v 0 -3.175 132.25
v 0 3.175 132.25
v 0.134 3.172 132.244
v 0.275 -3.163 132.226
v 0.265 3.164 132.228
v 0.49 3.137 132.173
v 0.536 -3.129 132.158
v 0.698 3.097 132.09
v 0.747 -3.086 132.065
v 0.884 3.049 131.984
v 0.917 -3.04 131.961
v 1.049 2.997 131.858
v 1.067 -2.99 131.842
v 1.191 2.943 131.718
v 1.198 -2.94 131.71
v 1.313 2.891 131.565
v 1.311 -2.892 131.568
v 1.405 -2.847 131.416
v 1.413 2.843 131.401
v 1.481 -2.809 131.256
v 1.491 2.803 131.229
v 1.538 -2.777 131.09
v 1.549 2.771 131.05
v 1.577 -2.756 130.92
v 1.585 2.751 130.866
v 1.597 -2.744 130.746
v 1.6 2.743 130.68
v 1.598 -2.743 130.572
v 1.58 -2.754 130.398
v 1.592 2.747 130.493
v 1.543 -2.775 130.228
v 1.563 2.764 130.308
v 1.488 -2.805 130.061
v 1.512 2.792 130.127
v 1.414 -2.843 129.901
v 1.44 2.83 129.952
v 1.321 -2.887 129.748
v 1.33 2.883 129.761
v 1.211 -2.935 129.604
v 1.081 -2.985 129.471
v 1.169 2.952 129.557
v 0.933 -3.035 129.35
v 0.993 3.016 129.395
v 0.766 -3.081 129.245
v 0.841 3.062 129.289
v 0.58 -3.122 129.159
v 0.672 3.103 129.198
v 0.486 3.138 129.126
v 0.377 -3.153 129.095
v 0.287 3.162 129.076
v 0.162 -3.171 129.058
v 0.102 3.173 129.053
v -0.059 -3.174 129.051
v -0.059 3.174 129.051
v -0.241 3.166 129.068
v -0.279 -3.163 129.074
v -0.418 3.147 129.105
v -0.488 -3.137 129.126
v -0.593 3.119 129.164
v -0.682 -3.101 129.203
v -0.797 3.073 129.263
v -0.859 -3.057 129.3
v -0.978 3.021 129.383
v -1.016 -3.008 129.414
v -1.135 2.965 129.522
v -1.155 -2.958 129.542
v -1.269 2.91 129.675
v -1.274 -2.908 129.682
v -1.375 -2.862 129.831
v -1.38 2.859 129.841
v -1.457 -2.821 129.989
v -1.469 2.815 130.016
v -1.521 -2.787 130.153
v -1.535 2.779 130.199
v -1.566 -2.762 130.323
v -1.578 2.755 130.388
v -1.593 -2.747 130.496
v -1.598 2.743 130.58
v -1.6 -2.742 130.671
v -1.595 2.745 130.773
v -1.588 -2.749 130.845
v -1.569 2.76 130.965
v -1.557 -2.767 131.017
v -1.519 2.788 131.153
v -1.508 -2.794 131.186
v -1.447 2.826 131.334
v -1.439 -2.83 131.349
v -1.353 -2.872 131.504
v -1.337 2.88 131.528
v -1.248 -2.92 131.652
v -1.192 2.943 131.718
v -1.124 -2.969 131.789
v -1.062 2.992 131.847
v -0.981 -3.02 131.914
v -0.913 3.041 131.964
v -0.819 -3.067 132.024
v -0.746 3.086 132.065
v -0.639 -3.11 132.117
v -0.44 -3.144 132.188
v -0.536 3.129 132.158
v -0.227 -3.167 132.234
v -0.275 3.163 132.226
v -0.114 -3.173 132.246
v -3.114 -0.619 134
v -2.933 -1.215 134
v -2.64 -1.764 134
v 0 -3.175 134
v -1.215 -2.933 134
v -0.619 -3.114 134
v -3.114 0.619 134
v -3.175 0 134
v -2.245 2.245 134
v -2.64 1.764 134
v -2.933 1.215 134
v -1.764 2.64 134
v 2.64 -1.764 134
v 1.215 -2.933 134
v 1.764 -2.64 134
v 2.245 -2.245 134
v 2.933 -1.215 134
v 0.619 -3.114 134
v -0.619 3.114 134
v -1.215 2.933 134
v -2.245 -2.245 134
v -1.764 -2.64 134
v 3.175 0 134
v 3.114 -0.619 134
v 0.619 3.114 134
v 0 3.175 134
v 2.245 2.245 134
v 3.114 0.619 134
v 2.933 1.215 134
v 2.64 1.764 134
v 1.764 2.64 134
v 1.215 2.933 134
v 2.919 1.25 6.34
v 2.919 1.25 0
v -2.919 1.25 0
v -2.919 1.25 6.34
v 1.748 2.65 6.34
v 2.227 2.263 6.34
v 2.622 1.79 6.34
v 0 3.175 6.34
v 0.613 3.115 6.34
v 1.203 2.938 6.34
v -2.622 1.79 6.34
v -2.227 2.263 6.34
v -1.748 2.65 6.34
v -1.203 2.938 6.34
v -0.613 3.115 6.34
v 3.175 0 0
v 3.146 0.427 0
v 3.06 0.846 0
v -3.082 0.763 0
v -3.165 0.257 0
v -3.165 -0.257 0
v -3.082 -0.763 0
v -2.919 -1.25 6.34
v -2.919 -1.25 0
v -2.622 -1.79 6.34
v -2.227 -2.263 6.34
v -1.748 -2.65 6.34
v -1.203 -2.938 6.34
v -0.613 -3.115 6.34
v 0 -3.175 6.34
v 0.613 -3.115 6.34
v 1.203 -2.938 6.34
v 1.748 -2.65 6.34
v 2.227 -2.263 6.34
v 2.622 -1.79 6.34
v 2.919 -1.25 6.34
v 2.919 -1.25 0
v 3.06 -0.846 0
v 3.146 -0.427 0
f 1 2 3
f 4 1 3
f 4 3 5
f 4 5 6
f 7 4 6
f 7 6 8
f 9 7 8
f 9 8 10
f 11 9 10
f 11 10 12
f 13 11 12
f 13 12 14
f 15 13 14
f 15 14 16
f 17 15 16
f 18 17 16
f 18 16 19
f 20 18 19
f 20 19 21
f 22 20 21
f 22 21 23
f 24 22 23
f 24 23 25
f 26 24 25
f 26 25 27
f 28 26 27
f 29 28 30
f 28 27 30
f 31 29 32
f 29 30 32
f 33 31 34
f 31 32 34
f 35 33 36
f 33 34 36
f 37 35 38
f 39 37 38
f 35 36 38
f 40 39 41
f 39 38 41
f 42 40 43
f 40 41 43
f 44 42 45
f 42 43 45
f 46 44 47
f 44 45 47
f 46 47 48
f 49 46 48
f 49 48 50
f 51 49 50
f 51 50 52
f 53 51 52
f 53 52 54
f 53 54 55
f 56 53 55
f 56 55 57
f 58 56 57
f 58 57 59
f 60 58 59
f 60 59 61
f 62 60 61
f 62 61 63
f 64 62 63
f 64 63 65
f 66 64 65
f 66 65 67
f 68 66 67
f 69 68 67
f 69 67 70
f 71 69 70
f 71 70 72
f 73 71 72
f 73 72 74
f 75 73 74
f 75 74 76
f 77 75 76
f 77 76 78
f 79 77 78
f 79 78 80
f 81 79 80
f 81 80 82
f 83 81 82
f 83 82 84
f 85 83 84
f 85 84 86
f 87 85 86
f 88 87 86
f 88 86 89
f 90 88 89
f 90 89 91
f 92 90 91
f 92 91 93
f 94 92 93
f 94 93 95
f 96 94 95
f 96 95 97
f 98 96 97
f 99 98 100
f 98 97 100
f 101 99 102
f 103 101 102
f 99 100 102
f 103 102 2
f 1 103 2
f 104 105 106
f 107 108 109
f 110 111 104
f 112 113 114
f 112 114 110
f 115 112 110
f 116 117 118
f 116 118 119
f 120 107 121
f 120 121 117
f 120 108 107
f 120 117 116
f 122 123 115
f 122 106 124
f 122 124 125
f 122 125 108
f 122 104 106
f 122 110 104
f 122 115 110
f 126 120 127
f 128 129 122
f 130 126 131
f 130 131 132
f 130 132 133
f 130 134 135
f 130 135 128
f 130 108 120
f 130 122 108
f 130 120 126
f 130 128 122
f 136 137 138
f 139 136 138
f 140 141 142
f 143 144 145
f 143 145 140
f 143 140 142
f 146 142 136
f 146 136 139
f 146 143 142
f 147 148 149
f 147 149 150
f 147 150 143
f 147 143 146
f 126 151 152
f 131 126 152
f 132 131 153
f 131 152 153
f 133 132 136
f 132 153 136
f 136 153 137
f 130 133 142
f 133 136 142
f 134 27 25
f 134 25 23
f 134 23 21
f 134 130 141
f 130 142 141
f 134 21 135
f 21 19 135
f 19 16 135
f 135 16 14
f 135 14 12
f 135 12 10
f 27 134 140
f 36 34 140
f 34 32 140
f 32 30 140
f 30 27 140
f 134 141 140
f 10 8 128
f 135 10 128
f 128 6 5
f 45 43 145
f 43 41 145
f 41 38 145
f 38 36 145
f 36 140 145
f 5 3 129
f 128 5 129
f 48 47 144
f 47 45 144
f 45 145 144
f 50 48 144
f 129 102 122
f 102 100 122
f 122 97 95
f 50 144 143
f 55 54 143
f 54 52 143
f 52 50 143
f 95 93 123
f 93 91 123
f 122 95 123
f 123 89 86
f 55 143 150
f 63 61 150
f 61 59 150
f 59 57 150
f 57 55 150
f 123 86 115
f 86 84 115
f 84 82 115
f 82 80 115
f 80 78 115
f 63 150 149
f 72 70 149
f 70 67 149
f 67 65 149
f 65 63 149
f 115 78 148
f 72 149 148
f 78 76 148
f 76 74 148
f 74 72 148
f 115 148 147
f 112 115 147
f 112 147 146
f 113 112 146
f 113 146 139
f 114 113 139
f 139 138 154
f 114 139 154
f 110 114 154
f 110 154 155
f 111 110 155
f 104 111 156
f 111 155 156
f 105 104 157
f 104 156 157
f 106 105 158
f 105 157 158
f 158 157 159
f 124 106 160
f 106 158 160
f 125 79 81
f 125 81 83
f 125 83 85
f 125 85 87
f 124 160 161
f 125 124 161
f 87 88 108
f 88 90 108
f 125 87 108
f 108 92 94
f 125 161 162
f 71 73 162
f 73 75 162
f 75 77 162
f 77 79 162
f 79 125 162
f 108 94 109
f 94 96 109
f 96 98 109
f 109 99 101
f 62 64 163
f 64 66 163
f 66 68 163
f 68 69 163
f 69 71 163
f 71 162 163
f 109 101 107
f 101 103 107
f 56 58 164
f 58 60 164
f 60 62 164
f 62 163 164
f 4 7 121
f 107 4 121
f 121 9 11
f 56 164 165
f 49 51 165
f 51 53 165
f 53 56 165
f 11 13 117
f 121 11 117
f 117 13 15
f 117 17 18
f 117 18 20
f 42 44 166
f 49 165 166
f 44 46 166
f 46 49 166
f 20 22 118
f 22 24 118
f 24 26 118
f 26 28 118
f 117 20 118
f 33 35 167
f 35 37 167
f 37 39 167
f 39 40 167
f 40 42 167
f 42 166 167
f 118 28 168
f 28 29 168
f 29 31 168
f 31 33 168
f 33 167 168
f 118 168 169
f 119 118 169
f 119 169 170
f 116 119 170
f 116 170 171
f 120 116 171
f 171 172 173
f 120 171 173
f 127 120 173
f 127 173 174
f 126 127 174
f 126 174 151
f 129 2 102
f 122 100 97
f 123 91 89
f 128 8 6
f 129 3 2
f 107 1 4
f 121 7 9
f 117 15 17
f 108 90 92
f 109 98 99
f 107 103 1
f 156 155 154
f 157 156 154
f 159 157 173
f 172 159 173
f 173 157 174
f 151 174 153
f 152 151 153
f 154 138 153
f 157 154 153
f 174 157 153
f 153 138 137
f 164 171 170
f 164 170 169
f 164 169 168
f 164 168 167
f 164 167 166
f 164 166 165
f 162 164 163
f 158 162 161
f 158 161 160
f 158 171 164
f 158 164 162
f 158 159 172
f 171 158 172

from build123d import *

# Parameters (mm, degrees)
SKETCH1_R           = 3.175
BOSS_EXTRUDE1_DEPTH = 134
CUT_EXTRUDE1_DEPTH  = 6.34
SKETCH5_R           = 1.6
CUT_EXTRUDE2_DEPTH  = 135.187939566


with BuildPart() as part:
    # Sketch1 → Boss-Extrude1 (new body)
    with BuildSketch(Plane.XY):
        Circle(SKETCH1_R)
    extrude(amount=BOSS_EXTRUDE1_DEPTH)

    # Sketch2 → Cut-Extrude1 (cut)
    with BuildSketch(Plane(origin=(0, 0, 0), x_dir=(-1, 0, 0), z_dir=(0, 0, -1))):
        with BuildLine():
            ThreePointArc((2.918582704, 1.25), (0, 3.175), (-2.918582704, 1.25))
            Line((-2.918582704, 1.25), (2.918582704, 1.25))
        make_face()
        with BuildLine():
            Line((2.918582704, -1.25), (-2.918582704, -1.25))
            ThreePointArc((-2.918582704, -1.25), (0, -3.175), (2.918582704, -1.25))
        make_face()
    extrude(amount=-CUT_EXTRUDE1_DEPTH, mode=Mode.SUBTRACT)

    # Sketch5 → Cut-Extrude2 (cut, through all)
    with BuildSketch(Plane(origin=(0, 3.175, 0), x_dir=(1, 0, 0), z_dir=(0, 1, 0))):
        with Locations(Location((0, -130.65, 0), (0, 0, 270))):
            Circle(SKETCH5_R)
    extrude(amount=-CUT_EXTRUDE2_DEPTH, mode=Mode.SUBTRACT)


solid = part.part
